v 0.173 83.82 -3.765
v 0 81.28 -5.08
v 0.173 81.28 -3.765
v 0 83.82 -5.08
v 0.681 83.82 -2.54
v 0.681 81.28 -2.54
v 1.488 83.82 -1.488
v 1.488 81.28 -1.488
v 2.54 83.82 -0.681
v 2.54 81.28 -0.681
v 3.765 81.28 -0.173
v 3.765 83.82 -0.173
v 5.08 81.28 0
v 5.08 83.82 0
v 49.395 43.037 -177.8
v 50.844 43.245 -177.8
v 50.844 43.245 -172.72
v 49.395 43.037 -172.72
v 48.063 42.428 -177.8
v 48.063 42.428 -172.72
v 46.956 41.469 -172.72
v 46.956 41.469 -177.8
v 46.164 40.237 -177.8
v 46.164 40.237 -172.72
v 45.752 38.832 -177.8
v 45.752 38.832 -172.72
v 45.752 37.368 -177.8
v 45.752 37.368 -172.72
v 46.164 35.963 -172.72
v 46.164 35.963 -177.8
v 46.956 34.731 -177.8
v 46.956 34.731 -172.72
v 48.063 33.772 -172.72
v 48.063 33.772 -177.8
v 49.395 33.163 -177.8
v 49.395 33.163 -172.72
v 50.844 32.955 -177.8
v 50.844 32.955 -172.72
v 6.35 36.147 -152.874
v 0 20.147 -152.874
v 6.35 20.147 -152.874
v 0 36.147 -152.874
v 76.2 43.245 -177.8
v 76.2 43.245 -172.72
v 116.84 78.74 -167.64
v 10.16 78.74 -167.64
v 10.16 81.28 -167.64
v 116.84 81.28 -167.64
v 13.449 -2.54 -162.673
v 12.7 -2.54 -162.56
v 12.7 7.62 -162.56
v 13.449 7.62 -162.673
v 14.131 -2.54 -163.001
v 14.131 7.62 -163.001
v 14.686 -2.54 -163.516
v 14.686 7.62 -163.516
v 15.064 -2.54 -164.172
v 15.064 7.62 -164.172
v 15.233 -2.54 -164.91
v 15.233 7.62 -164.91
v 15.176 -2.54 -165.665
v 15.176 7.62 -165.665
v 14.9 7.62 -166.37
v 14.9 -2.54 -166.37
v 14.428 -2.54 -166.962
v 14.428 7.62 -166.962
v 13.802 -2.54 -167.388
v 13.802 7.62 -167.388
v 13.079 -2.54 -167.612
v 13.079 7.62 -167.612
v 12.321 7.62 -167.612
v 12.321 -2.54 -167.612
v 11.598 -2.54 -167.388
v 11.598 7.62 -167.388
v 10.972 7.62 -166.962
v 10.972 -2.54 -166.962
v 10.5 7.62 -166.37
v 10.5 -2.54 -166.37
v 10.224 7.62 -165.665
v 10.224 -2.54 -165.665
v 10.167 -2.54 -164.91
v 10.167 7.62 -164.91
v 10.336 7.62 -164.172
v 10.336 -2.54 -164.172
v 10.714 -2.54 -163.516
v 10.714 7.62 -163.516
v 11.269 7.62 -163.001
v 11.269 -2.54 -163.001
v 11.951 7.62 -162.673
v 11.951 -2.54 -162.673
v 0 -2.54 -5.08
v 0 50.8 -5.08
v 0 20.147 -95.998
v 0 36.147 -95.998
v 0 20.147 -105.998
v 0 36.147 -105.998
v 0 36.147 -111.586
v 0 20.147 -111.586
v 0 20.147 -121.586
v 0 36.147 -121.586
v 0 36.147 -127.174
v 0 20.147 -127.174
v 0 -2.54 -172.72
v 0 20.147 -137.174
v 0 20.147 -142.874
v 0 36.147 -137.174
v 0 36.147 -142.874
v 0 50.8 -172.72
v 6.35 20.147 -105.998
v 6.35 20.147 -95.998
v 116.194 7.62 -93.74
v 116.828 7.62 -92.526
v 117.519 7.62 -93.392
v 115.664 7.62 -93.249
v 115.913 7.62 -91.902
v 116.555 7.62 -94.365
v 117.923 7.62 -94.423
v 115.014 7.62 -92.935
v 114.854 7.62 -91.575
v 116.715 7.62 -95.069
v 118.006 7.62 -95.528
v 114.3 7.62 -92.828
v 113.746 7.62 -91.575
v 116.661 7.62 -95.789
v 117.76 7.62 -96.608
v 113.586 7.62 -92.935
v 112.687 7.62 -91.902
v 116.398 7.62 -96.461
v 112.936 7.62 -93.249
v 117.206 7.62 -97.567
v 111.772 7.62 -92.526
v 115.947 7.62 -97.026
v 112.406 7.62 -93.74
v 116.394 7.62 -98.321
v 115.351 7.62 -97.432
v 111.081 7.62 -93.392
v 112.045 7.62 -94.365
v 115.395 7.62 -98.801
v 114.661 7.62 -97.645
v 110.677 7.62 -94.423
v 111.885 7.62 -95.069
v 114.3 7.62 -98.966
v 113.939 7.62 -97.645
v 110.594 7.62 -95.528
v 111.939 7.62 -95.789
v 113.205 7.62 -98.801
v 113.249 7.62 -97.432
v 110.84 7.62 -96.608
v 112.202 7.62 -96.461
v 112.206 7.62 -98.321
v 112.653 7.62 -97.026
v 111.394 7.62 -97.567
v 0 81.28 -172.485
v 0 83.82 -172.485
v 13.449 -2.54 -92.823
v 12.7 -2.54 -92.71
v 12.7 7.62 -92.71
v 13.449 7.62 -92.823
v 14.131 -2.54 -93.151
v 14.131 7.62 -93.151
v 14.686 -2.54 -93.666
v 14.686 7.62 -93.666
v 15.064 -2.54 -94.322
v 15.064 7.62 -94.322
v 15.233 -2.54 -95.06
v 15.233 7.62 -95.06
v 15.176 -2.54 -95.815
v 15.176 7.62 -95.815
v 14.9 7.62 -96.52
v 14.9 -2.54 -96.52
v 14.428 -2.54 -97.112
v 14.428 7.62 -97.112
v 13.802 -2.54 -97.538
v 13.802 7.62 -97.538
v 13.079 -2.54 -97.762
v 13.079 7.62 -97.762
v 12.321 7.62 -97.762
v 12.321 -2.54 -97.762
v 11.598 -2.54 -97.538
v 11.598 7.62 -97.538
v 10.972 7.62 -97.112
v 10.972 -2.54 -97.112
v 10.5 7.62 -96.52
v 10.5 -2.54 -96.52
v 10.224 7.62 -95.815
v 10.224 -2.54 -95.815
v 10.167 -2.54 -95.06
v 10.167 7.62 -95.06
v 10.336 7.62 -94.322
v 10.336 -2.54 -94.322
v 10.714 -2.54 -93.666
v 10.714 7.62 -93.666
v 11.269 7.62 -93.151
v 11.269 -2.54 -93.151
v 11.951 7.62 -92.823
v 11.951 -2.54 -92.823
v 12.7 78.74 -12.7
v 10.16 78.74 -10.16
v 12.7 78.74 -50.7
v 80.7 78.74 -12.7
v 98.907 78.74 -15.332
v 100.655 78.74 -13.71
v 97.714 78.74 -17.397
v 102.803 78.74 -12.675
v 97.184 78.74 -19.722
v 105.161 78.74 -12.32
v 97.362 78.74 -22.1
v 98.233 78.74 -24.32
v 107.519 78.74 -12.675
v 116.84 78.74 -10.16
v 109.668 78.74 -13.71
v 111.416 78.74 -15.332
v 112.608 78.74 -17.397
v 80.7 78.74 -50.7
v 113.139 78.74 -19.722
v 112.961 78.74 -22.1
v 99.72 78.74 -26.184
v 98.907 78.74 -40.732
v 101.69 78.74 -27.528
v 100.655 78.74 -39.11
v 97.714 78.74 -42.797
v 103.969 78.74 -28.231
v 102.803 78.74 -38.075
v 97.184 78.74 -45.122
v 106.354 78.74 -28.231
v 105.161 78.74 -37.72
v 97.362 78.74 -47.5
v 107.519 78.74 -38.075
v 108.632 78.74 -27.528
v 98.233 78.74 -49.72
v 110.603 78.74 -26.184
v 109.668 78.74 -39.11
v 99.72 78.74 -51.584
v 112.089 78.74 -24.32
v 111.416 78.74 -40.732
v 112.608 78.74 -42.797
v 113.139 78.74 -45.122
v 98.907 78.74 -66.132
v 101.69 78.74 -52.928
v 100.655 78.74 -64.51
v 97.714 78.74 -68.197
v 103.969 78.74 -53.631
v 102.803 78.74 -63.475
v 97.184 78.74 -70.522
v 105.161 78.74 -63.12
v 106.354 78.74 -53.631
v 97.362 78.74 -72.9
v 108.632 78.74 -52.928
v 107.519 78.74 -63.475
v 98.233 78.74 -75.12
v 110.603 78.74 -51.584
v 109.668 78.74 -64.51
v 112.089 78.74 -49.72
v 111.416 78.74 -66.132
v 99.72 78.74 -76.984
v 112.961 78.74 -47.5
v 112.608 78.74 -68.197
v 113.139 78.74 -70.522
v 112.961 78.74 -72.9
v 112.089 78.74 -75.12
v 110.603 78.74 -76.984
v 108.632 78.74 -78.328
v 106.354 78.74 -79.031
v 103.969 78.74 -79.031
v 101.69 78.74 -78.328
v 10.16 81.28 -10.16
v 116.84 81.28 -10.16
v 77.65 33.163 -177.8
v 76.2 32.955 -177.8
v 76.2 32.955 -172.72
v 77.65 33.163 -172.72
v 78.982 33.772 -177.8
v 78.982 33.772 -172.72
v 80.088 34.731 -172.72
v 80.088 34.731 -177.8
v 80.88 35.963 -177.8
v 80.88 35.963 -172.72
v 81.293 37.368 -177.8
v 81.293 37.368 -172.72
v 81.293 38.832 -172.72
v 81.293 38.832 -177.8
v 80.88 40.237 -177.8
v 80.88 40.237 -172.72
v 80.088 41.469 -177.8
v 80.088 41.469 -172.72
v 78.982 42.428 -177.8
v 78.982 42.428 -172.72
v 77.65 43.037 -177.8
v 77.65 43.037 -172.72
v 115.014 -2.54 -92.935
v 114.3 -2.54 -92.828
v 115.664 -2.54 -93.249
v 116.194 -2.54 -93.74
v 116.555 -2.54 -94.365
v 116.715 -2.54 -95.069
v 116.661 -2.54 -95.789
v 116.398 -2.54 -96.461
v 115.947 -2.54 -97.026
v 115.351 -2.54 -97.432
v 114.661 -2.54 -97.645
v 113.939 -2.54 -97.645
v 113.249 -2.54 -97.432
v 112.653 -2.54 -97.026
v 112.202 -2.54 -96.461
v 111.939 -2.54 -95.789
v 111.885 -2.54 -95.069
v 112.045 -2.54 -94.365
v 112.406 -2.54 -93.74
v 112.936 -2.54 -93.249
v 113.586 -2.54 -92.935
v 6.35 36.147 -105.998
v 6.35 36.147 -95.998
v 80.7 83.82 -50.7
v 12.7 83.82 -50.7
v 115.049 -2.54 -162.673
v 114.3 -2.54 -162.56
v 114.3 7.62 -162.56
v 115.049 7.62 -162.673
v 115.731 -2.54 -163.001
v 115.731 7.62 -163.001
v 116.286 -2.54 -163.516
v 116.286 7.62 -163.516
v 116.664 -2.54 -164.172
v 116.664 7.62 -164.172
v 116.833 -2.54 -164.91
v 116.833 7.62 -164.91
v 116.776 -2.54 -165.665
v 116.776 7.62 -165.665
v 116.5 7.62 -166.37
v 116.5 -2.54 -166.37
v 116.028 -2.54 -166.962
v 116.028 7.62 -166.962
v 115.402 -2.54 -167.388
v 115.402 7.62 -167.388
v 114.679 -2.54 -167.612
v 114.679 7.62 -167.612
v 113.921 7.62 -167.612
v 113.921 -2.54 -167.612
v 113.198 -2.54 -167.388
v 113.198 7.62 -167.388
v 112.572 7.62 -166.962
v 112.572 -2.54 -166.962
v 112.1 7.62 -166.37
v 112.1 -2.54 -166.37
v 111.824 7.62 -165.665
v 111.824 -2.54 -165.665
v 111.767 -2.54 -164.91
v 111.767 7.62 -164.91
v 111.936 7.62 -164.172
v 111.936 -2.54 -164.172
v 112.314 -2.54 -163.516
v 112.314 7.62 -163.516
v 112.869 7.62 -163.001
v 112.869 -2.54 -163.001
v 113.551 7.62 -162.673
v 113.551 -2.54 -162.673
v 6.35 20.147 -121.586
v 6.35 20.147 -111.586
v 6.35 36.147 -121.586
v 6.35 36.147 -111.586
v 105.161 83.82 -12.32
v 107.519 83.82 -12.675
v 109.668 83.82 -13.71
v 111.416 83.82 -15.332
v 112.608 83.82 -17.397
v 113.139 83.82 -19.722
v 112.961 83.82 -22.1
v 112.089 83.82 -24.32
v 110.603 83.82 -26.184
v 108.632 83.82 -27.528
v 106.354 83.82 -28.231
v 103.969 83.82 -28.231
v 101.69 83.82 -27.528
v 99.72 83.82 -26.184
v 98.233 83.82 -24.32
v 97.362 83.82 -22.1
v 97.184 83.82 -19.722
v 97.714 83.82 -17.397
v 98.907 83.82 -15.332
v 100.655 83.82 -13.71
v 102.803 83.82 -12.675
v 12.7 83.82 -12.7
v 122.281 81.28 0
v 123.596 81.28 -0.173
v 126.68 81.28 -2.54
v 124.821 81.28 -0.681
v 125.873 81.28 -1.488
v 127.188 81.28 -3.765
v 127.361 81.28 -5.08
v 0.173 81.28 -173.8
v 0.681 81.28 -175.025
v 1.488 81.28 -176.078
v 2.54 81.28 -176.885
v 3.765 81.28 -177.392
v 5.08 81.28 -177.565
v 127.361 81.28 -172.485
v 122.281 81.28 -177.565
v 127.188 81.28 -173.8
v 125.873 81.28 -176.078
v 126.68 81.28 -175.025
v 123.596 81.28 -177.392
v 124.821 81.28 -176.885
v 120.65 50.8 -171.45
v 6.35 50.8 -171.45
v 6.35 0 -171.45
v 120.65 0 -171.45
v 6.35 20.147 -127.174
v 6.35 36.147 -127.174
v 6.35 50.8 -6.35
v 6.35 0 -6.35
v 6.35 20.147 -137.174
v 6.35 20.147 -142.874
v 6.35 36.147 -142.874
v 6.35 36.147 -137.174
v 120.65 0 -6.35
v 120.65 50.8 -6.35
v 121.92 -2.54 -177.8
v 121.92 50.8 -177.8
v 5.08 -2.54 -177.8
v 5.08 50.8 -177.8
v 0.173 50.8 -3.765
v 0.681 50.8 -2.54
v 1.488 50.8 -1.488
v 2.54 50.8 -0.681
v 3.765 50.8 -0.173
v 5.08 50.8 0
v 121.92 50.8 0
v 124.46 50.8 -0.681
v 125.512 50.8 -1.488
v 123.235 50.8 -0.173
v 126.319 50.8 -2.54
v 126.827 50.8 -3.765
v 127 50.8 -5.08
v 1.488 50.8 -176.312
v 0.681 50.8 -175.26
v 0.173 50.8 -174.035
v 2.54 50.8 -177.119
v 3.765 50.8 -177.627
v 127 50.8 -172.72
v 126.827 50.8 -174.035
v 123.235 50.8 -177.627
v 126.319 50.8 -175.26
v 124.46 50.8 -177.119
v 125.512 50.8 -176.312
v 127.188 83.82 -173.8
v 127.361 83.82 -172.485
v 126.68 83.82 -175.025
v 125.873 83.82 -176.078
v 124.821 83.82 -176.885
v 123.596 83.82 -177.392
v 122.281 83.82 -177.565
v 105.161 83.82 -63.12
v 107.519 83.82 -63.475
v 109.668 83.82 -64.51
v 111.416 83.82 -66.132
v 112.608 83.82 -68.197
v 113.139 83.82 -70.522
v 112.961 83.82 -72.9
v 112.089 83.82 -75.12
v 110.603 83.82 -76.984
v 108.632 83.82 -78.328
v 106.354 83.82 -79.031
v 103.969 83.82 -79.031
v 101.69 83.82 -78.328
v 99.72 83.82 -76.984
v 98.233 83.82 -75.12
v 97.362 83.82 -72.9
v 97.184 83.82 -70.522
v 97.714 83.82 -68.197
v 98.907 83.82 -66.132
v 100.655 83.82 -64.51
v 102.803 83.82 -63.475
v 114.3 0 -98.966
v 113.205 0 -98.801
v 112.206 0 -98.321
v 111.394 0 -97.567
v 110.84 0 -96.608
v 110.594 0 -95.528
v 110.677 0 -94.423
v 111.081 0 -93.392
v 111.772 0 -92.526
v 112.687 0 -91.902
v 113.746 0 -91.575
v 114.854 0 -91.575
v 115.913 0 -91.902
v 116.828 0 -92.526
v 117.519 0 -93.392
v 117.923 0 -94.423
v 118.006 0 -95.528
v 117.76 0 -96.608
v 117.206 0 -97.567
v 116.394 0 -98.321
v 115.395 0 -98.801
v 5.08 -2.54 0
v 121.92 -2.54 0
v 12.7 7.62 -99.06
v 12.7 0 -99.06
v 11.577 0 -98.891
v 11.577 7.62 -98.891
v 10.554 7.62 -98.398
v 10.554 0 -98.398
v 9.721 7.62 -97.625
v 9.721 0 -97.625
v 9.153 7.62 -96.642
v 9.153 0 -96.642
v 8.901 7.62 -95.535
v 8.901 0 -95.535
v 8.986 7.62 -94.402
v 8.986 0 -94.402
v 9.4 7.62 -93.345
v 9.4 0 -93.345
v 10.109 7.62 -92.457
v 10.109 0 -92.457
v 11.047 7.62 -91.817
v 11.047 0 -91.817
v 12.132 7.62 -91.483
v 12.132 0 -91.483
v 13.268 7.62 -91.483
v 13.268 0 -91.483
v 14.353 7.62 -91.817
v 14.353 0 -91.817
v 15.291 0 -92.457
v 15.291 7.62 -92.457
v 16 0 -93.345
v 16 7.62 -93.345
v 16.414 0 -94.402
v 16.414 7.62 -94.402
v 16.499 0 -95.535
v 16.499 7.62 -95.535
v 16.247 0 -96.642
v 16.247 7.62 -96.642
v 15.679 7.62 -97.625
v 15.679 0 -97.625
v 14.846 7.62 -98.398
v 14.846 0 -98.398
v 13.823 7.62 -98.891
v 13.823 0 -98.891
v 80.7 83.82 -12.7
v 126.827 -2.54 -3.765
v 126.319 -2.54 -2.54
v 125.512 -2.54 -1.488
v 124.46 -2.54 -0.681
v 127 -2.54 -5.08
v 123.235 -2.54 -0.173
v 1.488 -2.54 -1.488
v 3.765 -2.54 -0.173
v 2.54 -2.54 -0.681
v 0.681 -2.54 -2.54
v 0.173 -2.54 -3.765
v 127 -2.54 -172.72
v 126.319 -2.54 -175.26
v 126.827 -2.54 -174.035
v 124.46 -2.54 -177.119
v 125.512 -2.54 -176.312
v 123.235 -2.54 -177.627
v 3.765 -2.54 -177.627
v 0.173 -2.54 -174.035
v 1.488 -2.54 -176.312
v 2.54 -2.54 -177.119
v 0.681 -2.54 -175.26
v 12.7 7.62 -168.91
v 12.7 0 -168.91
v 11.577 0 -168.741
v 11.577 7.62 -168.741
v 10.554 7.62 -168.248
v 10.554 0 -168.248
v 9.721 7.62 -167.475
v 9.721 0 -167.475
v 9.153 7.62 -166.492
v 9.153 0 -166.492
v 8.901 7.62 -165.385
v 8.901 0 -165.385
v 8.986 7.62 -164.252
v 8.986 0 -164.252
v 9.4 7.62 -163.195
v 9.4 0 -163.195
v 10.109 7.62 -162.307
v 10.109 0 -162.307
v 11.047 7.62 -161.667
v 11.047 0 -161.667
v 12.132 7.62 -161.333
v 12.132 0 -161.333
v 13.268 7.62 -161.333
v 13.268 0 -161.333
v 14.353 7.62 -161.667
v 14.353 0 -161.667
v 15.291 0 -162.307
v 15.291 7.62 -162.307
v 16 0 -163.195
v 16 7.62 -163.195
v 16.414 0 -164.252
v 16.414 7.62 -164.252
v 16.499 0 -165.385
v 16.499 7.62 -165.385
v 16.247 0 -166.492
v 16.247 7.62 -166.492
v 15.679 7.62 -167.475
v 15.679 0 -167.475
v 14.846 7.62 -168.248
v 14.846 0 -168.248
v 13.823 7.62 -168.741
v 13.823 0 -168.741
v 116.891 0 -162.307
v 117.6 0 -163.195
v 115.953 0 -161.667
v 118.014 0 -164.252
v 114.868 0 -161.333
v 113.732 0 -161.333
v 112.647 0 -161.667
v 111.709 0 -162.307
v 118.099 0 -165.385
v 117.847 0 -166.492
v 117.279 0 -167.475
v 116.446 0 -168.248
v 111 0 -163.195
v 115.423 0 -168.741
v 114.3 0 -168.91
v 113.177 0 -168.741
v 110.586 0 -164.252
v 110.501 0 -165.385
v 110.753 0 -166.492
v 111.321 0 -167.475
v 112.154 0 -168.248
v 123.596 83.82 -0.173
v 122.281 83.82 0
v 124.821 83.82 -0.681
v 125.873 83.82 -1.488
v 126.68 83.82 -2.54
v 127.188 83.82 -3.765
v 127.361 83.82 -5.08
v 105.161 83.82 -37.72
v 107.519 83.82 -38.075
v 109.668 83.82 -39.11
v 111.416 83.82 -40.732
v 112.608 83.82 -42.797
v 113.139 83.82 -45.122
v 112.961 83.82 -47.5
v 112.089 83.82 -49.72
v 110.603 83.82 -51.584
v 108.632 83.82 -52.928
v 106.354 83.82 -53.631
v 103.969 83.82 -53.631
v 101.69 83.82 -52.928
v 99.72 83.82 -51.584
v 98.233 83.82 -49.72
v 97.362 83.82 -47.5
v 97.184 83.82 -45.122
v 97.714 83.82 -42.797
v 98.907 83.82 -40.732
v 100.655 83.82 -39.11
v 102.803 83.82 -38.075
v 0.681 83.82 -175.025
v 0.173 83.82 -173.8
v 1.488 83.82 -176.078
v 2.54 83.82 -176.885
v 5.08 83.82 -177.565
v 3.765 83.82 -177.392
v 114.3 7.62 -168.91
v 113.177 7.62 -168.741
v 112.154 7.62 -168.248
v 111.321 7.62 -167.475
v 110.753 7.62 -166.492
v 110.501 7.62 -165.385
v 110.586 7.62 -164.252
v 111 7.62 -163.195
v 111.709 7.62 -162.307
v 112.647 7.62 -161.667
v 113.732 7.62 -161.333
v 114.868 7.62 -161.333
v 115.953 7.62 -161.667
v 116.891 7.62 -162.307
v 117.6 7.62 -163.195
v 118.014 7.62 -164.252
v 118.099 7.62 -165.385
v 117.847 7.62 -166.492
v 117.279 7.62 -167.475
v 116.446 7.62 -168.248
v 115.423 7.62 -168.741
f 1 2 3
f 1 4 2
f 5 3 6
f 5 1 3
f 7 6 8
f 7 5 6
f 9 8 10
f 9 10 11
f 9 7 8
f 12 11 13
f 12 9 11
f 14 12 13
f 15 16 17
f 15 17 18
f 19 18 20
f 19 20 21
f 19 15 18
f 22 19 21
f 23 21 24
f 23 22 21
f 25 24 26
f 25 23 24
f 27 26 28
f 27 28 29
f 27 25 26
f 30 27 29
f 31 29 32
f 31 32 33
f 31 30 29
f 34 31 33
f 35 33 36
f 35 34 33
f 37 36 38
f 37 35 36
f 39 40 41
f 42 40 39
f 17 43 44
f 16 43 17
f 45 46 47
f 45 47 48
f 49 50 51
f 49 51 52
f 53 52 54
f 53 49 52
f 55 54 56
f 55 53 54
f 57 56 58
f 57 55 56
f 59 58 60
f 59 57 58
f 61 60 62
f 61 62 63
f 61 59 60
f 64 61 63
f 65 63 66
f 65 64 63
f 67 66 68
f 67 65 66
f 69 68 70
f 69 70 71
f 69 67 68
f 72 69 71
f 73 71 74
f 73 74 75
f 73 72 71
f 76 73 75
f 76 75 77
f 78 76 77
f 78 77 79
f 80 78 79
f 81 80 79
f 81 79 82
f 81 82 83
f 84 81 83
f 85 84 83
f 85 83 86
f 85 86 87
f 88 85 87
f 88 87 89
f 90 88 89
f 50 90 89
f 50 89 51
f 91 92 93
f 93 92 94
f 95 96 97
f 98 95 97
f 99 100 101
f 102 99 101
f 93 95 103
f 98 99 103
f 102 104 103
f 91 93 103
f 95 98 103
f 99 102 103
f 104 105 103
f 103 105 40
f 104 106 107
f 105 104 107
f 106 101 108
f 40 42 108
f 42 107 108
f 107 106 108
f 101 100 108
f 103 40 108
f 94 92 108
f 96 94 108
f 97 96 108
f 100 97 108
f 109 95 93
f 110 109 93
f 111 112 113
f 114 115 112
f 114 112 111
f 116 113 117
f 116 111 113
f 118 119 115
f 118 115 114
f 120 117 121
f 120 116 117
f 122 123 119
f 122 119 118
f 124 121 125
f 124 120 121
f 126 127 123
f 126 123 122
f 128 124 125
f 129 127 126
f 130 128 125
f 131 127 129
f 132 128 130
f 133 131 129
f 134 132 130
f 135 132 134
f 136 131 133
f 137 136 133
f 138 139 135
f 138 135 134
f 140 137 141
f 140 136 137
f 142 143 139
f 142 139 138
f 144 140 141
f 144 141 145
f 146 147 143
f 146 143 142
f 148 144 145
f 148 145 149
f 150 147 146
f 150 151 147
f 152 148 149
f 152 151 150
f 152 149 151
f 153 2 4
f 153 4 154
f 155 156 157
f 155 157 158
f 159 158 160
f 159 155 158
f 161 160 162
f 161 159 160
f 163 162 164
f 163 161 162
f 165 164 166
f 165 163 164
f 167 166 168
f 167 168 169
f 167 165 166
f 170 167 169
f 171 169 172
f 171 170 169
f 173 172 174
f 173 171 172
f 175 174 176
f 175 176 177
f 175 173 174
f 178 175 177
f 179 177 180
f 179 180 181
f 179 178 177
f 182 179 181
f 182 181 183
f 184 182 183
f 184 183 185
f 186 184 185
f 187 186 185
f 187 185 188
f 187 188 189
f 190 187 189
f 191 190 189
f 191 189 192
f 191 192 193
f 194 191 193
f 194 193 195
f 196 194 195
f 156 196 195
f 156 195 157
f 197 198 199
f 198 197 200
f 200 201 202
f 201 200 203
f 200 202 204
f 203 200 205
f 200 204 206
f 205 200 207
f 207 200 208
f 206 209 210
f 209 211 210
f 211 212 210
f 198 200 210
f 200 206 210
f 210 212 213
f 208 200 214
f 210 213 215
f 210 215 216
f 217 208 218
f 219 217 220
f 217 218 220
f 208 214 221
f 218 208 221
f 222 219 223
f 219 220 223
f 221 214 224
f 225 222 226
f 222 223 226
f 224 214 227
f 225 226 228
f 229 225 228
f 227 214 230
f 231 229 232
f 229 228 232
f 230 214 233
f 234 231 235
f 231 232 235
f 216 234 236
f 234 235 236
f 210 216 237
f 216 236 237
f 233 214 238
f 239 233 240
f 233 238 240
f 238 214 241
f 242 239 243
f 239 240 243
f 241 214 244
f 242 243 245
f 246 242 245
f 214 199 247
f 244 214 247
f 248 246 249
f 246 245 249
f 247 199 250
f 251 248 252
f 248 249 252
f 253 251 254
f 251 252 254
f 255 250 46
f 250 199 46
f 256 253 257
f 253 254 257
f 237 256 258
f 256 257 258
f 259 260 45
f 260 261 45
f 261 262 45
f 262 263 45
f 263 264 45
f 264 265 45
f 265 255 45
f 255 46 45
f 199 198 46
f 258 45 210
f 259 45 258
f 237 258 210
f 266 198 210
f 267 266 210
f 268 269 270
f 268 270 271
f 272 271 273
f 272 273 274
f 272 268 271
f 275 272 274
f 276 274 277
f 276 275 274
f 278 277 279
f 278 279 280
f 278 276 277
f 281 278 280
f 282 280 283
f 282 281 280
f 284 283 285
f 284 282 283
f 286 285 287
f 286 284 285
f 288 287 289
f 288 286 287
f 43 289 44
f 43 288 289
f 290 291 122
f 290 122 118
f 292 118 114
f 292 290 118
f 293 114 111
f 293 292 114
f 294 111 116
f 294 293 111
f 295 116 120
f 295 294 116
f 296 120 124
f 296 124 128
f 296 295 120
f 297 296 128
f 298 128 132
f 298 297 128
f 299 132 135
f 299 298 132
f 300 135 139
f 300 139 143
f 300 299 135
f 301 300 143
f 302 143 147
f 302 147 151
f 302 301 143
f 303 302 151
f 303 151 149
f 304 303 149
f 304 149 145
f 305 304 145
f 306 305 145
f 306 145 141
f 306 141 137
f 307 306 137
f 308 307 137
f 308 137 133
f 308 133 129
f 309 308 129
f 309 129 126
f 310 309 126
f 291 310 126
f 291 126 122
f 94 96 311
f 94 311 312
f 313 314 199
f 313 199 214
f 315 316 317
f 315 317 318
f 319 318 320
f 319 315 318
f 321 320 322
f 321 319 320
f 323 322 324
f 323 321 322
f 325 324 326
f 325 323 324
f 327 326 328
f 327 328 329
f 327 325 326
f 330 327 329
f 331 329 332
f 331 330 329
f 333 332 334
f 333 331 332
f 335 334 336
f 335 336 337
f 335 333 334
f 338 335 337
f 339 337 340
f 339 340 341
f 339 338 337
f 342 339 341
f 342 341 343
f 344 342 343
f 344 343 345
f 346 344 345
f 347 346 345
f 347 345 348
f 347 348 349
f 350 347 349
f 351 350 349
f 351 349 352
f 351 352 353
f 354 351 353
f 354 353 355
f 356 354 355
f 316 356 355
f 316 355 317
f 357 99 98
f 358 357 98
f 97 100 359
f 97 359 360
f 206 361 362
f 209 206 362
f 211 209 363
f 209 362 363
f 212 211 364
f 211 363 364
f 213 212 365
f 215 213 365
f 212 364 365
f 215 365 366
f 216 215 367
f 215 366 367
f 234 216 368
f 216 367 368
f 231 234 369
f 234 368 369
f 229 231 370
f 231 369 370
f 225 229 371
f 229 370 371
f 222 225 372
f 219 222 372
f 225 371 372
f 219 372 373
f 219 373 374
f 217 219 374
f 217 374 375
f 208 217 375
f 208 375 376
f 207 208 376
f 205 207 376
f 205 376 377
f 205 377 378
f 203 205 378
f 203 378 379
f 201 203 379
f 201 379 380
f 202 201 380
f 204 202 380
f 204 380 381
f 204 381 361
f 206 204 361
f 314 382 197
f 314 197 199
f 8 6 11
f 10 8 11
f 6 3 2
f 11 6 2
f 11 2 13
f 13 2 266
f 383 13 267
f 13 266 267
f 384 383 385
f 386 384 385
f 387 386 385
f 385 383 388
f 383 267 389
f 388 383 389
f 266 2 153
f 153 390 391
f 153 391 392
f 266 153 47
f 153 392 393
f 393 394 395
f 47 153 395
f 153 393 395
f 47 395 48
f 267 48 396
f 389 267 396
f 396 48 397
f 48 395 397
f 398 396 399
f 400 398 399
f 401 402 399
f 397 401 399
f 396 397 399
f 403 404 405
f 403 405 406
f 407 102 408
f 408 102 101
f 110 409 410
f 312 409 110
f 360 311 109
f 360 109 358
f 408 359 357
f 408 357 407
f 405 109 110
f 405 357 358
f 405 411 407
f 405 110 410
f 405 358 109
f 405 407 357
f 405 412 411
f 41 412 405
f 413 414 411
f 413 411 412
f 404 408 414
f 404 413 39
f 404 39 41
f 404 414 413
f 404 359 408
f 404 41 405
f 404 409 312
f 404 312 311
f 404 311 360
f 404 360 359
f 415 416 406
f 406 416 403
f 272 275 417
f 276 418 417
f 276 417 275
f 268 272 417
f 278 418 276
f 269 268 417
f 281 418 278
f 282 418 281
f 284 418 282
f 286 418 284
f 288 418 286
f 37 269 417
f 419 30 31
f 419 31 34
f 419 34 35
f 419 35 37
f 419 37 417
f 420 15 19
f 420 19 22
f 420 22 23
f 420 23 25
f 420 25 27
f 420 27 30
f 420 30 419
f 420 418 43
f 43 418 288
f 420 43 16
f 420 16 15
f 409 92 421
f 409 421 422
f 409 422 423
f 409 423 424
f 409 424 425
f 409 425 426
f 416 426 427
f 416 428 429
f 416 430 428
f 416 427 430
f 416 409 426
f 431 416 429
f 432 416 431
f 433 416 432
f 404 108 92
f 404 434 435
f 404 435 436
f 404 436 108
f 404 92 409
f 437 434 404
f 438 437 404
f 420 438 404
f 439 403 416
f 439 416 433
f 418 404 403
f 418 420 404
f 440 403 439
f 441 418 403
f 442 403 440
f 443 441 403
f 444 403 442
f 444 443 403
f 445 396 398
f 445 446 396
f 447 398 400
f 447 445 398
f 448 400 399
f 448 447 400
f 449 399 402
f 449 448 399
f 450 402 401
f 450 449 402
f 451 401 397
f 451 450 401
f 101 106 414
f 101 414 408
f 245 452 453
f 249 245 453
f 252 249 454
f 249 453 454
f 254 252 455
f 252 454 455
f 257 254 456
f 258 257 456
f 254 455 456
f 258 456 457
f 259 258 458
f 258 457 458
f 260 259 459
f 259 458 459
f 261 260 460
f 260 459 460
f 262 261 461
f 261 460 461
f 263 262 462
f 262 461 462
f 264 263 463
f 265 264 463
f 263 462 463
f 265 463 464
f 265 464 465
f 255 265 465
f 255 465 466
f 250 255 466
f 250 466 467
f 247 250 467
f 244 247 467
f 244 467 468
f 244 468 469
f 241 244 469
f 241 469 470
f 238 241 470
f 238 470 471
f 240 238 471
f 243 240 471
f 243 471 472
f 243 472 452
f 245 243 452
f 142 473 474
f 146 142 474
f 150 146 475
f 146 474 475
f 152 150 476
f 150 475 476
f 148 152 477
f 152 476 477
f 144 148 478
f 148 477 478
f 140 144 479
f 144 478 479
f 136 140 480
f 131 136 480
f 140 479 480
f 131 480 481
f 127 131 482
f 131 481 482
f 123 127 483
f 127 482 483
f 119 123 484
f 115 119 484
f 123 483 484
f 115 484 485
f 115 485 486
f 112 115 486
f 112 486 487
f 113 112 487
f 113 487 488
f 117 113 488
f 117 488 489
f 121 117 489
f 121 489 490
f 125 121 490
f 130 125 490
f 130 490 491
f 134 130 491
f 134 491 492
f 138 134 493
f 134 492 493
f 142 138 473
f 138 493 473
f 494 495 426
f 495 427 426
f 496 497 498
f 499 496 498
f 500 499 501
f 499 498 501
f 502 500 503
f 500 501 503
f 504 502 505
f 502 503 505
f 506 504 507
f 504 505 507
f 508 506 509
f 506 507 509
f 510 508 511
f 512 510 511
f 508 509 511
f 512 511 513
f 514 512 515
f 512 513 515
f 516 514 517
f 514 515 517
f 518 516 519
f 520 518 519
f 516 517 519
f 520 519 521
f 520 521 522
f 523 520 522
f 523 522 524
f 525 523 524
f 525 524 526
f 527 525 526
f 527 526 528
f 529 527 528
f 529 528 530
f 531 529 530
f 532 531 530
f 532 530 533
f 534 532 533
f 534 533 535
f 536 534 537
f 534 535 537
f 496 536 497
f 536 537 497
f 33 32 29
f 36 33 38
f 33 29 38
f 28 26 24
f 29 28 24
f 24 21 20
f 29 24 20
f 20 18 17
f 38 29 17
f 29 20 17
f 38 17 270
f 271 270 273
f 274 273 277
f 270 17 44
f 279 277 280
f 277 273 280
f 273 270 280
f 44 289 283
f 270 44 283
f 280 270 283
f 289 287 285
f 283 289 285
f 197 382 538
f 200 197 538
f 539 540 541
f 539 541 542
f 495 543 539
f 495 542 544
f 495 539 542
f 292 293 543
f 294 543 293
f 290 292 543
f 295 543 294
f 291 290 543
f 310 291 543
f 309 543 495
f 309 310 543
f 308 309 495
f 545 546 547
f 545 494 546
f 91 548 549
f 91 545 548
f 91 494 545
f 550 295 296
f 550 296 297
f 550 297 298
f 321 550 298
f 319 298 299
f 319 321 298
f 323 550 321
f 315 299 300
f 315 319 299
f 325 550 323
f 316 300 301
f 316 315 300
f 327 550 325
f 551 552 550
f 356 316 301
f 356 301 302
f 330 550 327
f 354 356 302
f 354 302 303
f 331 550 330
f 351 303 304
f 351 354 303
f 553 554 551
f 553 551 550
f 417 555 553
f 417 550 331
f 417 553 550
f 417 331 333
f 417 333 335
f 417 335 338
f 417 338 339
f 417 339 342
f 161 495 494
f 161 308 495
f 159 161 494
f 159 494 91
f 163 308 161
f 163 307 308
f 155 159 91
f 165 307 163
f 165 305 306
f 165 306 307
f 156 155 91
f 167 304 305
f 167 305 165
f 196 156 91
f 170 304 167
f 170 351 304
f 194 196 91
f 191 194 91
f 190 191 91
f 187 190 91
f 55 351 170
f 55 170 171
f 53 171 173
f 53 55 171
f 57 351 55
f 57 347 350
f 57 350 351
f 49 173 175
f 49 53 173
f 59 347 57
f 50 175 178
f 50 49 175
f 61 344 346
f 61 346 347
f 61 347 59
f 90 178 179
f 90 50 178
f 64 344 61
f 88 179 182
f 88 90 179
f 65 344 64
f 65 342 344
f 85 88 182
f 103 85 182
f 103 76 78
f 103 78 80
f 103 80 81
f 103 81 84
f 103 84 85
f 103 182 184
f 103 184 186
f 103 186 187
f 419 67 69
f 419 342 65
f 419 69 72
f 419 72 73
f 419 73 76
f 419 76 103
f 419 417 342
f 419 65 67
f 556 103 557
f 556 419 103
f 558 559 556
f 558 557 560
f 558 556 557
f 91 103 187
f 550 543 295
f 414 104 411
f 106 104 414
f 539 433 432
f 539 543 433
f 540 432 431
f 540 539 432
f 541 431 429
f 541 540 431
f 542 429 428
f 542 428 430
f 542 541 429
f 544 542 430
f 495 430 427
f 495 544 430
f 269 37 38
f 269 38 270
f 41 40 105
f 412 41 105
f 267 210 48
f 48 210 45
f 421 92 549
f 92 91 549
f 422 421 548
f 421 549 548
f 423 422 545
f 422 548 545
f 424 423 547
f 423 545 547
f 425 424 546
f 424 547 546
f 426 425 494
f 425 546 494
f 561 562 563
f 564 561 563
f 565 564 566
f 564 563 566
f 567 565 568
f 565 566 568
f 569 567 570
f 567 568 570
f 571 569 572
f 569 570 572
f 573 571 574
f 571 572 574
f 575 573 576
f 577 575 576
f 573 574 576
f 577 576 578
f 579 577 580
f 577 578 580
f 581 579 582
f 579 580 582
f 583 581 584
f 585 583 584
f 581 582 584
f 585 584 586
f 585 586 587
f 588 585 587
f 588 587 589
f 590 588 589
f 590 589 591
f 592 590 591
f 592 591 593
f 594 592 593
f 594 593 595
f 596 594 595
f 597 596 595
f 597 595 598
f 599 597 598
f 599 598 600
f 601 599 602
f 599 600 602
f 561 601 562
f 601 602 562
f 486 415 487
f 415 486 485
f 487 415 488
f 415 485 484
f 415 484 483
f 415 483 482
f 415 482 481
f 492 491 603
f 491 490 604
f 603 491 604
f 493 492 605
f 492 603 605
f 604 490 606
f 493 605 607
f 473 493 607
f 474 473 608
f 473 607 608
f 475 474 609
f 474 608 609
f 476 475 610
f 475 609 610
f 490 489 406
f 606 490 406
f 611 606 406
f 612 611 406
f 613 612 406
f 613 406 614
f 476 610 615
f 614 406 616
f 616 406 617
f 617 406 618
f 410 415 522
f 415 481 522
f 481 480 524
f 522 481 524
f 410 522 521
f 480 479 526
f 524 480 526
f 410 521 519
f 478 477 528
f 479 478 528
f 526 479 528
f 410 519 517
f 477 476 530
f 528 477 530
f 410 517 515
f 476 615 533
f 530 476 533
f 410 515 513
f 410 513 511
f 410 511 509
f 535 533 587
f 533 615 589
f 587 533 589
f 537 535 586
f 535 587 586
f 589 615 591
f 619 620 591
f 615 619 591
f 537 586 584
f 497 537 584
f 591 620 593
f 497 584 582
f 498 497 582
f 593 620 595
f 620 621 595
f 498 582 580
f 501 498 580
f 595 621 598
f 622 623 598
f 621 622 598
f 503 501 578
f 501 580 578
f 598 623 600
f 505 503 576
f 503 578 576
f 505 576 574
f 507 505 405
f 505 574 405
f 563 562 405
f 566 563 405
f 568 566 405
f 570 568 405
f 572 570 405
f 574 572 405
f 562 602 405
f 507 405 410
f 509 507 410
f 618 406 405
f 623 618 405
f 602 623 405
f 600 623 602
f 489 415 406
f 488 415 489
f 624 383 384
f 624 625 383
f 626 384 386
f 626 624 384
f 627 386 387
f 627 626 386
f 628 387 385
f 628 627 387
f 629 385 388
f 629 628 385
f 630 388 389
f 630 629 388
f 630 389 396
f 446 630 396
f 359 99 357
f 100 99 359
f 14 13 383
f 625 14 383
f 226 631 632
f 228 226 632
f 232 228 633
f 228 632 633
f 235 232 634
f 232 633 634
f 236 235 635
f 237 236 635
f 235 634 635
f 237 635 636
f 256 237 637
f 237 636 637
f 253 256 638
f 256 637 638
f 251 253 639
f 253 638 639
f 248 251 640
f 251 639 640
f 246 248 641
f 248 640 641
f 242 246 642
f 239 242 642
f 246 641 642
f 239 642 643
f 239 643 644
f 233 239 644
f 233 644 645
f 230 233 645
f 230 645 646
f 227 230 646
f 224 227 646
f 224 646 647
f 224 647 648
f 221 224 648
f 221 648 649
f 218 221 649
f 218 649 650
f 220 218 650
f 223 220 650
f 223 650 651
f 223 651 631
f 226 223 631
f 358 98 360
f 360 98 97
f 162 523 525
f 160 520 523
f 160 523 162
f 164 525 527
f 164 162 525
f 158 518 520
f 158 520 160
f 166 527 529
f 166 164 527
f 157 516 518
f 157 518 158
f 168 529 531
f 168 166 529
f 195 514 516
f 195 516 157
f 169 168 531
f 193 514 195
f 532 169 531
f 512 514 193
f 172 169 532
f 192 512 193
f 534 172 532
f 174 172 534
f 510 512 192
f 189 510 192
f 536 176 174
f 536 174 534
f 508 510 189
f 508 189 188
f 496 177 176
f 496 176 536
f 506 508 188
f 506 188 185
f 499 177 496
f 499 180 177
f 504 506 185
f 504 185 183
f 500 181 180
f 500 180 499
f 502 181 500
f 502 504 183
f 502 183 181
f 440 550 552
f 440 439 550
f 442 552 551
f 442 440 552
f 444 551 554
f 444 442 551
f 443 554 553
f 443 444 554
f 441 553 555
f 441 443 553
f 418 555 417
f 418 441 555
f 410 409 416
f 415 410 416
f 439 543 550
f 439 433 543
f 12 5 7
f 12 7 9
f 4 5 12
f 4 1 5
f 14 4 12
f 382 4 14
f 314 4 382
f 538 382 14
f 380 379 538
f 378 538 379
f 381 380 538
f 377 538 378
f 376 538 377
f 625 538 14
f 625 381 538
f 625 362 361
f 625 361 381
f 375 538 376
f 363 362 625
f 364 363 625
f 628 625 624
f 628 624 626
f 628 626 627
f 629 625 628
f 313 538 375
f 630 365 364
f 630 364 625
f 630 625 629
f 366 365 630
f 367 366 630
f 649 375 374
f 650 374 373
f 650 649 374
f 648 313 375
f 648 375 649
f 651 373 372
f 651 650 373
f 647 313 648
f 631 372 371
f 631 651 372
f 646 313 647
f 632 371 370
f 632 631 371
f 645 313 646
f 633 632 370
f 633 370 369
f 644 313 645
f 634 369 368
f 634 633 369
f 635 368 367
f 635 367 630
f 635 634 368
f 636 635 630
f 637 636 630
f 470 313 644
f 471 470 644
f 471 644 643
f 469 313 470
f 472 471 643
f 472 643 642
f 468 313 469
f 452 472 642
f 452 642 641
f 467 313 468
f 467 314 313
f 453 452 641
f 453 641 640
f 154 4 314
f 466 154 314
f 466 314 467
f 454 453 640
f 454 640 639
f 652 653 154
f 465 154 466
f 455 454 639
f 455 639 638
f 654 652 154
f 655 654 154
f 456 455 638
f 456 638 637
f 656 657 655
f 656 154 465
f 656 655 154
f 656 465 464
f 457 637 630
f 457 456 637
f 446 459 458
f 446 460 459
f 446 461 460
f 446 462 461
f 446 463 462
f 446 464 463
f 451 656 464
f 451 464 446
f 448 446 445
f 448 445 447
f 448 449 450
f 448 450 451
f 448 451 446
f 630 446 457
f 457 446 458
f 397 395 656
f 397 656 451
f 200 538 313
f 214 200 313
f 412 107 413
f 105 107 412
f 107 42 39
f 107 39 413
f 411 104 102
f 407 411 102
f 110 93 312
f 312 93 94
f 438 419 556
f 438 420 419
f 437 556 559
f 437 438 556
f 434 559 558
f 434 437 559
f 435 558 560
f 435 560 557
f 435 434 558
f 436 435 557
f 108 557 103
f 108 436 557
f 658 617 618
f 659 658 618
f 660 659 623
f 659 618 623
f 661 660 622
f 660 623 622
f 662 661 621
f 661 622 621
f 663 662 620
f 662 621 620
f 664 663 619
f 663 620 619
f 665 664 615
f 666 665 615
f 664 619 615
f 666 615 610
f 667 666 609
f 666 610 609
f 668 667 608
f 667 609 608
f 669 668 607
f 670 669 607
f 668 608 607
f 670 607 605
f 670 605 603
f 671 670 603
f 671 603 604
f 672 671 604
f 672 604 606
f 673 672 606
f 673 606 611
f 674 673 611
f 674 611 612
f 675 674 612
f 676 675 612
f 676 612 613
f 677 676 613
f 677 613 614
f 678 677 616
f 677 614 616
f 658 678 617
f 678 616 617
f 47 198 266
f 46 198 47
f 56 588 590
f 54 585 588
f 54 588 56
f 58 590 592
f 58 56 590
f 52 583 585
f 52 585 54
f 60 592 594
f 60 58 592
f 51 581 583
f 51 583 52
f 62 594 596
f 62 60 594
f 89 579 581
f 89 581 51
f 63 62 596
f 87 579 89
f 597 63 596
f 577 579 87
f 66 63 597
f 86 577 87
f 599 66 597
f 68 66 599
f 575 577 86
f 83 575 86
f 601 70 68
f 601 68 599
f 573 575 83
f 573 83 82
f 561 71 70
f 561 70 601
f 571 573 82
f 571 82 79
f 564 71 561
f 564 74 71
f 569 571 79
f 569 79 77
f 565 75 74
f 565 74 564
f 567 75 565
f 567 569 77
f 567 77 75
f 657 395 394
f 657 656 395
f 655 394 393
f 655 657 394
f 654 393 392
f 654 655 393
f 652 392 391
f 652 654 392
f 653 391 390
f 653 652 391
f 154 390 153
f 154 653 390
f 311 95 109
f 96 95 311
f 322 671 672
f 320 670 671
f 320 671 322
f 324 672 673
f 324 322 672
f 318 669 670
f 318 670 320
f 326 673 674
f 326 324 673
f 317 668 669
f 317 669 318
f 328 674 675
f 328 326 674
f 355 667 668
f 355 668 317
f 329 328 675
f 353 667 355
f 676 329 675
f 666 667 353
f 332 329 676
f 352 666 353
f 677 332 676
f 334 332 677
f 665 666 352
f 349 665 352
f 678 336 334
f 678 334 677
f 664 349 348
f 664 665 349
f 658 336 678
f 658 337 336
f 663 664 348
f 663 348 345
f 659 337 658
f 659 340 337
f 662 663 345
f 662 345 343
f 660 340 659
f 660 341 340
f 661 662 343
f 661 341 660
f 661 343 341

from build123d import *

# Parameters (mm, degrees)
SKETCH1_W           = 127
SKETCH1_H           = 177.8
BOSS_EXTRUDE1_DEPTH = 50.8
SKETCH2_W           = 114.3
SKETCH2_H           = 165.1
CUT_EXTRUDE1_DEPTH  = 50.8
SKETCH4_W           = 127
SKETCH4_H           = 177.8
BOSS_EXTRUDE2_DEPTH = 2.54
SKETCH5_W           = 106.68
SKETCH5_H           = 157.48
BOSS_EXTRUDE3_DEPTH = 2.54
SKETCH6_W           = 127.36100261
SKETCH6_H           = 177.565468033
BOSS_EXTRUDE4_DEPTH = 2.54
SKETCH7_R           = 8
SKETCH7_W           = 68
SKETCH7_H           = 38
CUT_EXTRUDE2_DEPTH  = 7.62
FILLET1_R           = 5.08
FILLET2_R           = 5.08
FILLET3_R           = 5.08
FILLET4_R           = 5.08
FILLET5_R           = 5.08
FILLET6_R           = 5.08
FILLET7_R           = 5.08
FILLET8_R           = 5.08
CUT_EXTRUDE3_DEPTH  = 5.08
CUT_EXTRUDE5_DEPTH  = 10.16
SKETCH10_3_W        = 10
SKETCH10_3_H        = 16
CUT_EXTRUDE6_DEPTH  = 10.16
SKETCH12_R          = 3.716498952
SKETCH12_R_2        = 2.42212238
SKETCH12_R_3        = 3.81
SKETCH12_R_4        = 2.54
BOSS_EXTRUDE5_DEPTH = 7.62
CUT_EXTRUDE7_START  = -2.54
SKETCH14_R          = 2.42212238
CUT_EXTRUDE7_DEPTH  = 2.54
CUT_EXTRUDE8_START  = -2.54
SKETCH15_R          = 2.54
CUT_EXTRUDE8_DEPTH  = 2.54
CUT_EXTRUDE9_START  = -2.54
SKETCH16_R          = 2.54
CUT_EXTRUDE9_DEPTH  = 2.54
CUT_EXTRUDE10_START = -2.54
SKETCH17_R          = 2.54
CUT_EXTRUDE10_DEPTH = 2.54


with BuildPart() as part:
    # Sketch1 → Boss-Extrude1 (new body)
    with BuildSketch(Plane(origin=(0, 0, 0), x_dir=(1, 0, 0), z_dir=(0, 1, 0))):
        with Locations((63.5, 88.9)):
            Rectangle(SKETCH1_W, SKETCH1_H)
    extrude(amount=BOSS_EXTRUDE1_DEPTH)

    # Sketch2 → Cut-Extrude1 (cut)
    with BuildSketch(Plane(origin=(0, 50.8, 0), x_dir=(1, 0, 0), z_dir=(0, 1, 0))):
        with Locations((63.5, 88.9)):
            Rectangle(SKETCH2_W, SKETCH2_H)
    extrude(amount=-CUT_EXTRUDE1_DEPTH, mode=Mode.SUBTRACT)

    # Sketch4 → Boss-Extrude2 (add)
    with BuildSketch(Plane(origin=(0, 0, 0), x_dir=(-1, 0, 0), z_dir=(0, -1, 0))):
        with Locations((-63.5, 88.9)):
            Rectangle(SKETCH4_W, SKETCH4_H)
    extrude(amount=BOSS_EXTRUDE2_DEPTH)

    # Fillet1
    fillet1_edges = [part.edges().sort_by_distance(p)[0] for p in [
        (127, 24.13, 0),
    ]]
    fillet(fillet1_edges, radius=FILLET1_R)

    # Fillet3
    fillet3_edges = [part.edges().sort_by_distance(p)[0] for p in [
        (127, 24.13, -177.8),
    ]]
    fillet(fillet3_edges, radius=FILLET3_R)

    # Fillet4
    fillet4_edges = [part.edges().sort_by_distance(p)[0] for p in [
        (0, 24.13, -177.8),
    ]]
    fillet(fillet4_edges, radius=FILLET4_R)

    # Fillet5
    fillet5_edges = [part.edges().sort_by_distance(p)[0] for p in [
        (0, 24.13, 0),
    ]]
    fillet(fillet5_edges, radius=FILLET5_R)

    # Sketch9 → Cut-Extrude3 (cut)
    with BuildSketch(Plane(origin=(0, 0, -177.8), x_dir=(-1, 0, 0), z_dir=(0, 0, -1))):
        with BuildLine():
            Line((-50.844364587, 32.954781393), (-76.2, 32.954781393))
            ThreePointArc((-76.2, 32.954781393), (-81.345218607, 38.1), (-76.2, 43.245218607))
            Line((-76.2, 43.245218607), (-50.844364587, 43.245218607))
            ThreePointArc((-50.844364587, 43.245218607), (-45.69914598, 38.1), (-50.844364587, 32.954781393))
        make_face()
    extrude(amount=-CUT_EXTRUDE3_DEPTH, mode=Mode.SUBTRACT)

    # Sketch10 → Cut-Extrude5 (cut)
    with BuildSketch(Plane.ZY):
        Polygon((-144.874057785, 20.146804291), (-152.874057785, 20.146804291), (-152.874057785, 36.146804291), (-142.874057785, 36.146804291), (-142.874057785, 20.146804291), align=None)
    extrude(amount=-CUT_EXTRUDE5_DEPTH, mode=Mode.SUBTRACT)

    # Sketch10<3> → Cut-Extrude6 (cut)
    with BuildSketch(Plane.ZY):
        with Locations((-132.174057785, 28.146804291)):
            Rectangle(SKETCH10_3_W, SKETCH10_3_H)
        with Locations((-116.586057785, 28.146804291)):
            Rectangle(SKETCH10_3_W, SKETCH10_3_H)
        with Locations((-100.998057785, 28.146804291)):
            Rectangle(SKETCH10_3_W, SKETCH10_3_H)
    extrude(amount=-CUT_EXTRUDE6_DEPTH, mode=Mode.SUBTRACT)

    # Sketch12 → Boss-Extrude5 (add)
    # profile 1 of 4: a face of its own
    with BuildSketch(Plane(origin=(0, 0, 0), x_dir=(1, 0, 0), z_dir=(0, 1, 0))):
        with Locations((114.3, 95.25)):
            Circle(SKETCH12_R)
        with Locations((114.3, 95.25)):
            Circle(SKETCH12_R_2, mode=Mode.SUBTRACT)
    # profile 2 of 4: a face of its own
    with BuildSketch(Plane(origin=(0, 0, 0), x_dir=(1, 0, 0), z_dir=(0, 1, 0))):
        with Locations((12.7, 95.25)):
            Circle(SKETCH12_R_3)
        with Locations((12.7, 95.25)):
            Circle(SKETCH12_R_4, mode=Mode.SUBTRACT)
    # profile 3 of 4: a face of its own
    with BuildSketch(Plane(origin=(0, 0, 0), x_dir=(1, 0, 0), z_dir=(0, 1, 0))):
        with Locations((12.7, 165.1)):
            Circle(SKETCH12_R_3)
        with Locations((12.7, 165.1)):
            Circle(SKETCH12_R_4, mode=Mode.SUBTRACT)
    # profile 4 of 4: a face of its own
    with BuildSketch(Plane(origin=(0, 0, 0), x_dir=(1, 0, 0), z_dir=(0, 1, 0))):
        with Locations((114.3, 165.1)):
            Circle(SKETCH12_R_3)
        with Locations((114.3, 165.1)):
            Circle(SKETCH12_R_4, mode=Mode.SUBTRACT)
    extrude(amount=BOSS_EXTRUDE5_DEPTH)

    # Sketch14 → Cut-Extrude7 (cut)
    with BuildSketch(Plane(origin=(0, 0, 0), x_dir=(1, 0, 0), z_dir=(0, 1, 0)).offset(CUT_EXTRUDE7_START)):
        with Locations((114.3, 95.25)):
            Circle(SKETCH14_R)
    extrude(amount=CUT_EXTRUDE7_DEPTH, mode=Mode.SUBTRACT)

    # Sketch15 → Cut-Extrude8 (cut)
    with BuildSketch(Plane(origin=(0, 0, 0), x_dir=(1, 0, 0), z_dir=(0, 1, 0)).offset(CUT_EXTRUDE8_START)):
        with Locations((114.3, 165.1)):
            Circle(SKETCH15_R)
    extrude(amount=CUT_EXTRUDE8_DEPTH, mode=Mode.SUBTRACT)

    # Sketch16 → Cut-Extrude9 (cut)
    with BuildSketch(Plane(origin=(0, 0, 0), x_dir=(1, 0, 0), z_dir=(0, 1, 0)).offset(CUT_EXTRUDE9_START)):
        with Locations((12.7, 165.1)):
            Circle(SKETCH16_R)
    extrude(amount=CUT_EXTRUDE9_DEPTH, mode=Mode.SUBTRACT)

    # Sketch17 → Cut-Extrude10 (cut)
    with BuildSketch(Plane(origin=(0, 0, 0), x_dir=(1, 0, 0), z_dir=(0, 1, 0)).offset(CUT_EXTRUDE10_START)):
        with Locations((12.7, 95.25)):
            Circle(SKETCH17_R)
    extrude(amount=CUT_EXTRUDE10_DEPTH, mode=Mode.SUBTRACT)


with BuildPart() as body_2:
    # Sketch5 → Boss-Extrude3 (new body)
    with BuildSketch(Plane(origin=(0, 78.74, 0), x_dir=(1, 0, 0), z_dir=(0, 1, 0))):
        with Locations((63.5, 88.9)):
            Rectangle(SKETCH5_W, SKETCH5_H)
    extrude(amount=BOSS_EXTRUDE3_DEPTH)

    # Sketch6 → Boss-Extrude4 (add)
    with BuildSketch(Plane(origin=(0, 81.28, 0), x_dir=(1, 0, 0), z_dir=(0, 1, 0))):
        with Locations((63.680501305, 88.782734017)):
            Rectangle(SKETCH6_W, SKETCH6_H)
    extrude(amount=BOSS_EXTRUDE4_DEPTH)

    # Sketch7 → Cut-Extrude2 (cut)
    with BuildSketch(Plane(origin=(0, 83.82, 0), x_dir=(1, 0, 0), z_dir=(0, 1, 0))):
        with Locations((105.161265821, 20.32)):
            Circle(SKETCH7_R)
        with Locations((105.161265821, 45.72)):
            Circle(SKETCH7_R)
        with Locations((105.161265821, 71.12)):
            Circle(SKETCH7_R)
        with Locations((46.7, 31.7)):
            Rectangle(SKETCH7_W, SKETCH7_H)
    extrude(amount=-CUT_EXTRUDE2_DEPTH, mode=Mode.SUBTRACT)

    # Fillet2
    fillet2_edges = [body_2.edges().sort_by_distance(p)[0] for p in [
        (127.36100261, 82.55, 0),
    ]]
    fillet(fillet2_edges, radius=FILLET2_R)

    # Fillet6
    fillet6_edges = [body_2.edges().sort_by_distance(p)[0] for p in [
        (127.36100261, 82.55, -177.565468033),
    ]]
    fillet(fillet6_edges, radius=FILLET6_R)

    # Fillet7
    fillet7_edges = [body_2.edges().sort_by_distance(p)[0] for p in [
        (0, 82.55, -177.565468033),
    ]]
    fillet(fillet7_edges, radius=FILLET7_R)

    # Fillet8
    fillet8_edges = [body_2.edges().sort_by_distance(p)[0] for p in [
        (0, 82.55, 0),
    ]]
    fillet(fillet8_edges, radius=FILLET8_R)


solid = Compound([part.part, body_2.part])
